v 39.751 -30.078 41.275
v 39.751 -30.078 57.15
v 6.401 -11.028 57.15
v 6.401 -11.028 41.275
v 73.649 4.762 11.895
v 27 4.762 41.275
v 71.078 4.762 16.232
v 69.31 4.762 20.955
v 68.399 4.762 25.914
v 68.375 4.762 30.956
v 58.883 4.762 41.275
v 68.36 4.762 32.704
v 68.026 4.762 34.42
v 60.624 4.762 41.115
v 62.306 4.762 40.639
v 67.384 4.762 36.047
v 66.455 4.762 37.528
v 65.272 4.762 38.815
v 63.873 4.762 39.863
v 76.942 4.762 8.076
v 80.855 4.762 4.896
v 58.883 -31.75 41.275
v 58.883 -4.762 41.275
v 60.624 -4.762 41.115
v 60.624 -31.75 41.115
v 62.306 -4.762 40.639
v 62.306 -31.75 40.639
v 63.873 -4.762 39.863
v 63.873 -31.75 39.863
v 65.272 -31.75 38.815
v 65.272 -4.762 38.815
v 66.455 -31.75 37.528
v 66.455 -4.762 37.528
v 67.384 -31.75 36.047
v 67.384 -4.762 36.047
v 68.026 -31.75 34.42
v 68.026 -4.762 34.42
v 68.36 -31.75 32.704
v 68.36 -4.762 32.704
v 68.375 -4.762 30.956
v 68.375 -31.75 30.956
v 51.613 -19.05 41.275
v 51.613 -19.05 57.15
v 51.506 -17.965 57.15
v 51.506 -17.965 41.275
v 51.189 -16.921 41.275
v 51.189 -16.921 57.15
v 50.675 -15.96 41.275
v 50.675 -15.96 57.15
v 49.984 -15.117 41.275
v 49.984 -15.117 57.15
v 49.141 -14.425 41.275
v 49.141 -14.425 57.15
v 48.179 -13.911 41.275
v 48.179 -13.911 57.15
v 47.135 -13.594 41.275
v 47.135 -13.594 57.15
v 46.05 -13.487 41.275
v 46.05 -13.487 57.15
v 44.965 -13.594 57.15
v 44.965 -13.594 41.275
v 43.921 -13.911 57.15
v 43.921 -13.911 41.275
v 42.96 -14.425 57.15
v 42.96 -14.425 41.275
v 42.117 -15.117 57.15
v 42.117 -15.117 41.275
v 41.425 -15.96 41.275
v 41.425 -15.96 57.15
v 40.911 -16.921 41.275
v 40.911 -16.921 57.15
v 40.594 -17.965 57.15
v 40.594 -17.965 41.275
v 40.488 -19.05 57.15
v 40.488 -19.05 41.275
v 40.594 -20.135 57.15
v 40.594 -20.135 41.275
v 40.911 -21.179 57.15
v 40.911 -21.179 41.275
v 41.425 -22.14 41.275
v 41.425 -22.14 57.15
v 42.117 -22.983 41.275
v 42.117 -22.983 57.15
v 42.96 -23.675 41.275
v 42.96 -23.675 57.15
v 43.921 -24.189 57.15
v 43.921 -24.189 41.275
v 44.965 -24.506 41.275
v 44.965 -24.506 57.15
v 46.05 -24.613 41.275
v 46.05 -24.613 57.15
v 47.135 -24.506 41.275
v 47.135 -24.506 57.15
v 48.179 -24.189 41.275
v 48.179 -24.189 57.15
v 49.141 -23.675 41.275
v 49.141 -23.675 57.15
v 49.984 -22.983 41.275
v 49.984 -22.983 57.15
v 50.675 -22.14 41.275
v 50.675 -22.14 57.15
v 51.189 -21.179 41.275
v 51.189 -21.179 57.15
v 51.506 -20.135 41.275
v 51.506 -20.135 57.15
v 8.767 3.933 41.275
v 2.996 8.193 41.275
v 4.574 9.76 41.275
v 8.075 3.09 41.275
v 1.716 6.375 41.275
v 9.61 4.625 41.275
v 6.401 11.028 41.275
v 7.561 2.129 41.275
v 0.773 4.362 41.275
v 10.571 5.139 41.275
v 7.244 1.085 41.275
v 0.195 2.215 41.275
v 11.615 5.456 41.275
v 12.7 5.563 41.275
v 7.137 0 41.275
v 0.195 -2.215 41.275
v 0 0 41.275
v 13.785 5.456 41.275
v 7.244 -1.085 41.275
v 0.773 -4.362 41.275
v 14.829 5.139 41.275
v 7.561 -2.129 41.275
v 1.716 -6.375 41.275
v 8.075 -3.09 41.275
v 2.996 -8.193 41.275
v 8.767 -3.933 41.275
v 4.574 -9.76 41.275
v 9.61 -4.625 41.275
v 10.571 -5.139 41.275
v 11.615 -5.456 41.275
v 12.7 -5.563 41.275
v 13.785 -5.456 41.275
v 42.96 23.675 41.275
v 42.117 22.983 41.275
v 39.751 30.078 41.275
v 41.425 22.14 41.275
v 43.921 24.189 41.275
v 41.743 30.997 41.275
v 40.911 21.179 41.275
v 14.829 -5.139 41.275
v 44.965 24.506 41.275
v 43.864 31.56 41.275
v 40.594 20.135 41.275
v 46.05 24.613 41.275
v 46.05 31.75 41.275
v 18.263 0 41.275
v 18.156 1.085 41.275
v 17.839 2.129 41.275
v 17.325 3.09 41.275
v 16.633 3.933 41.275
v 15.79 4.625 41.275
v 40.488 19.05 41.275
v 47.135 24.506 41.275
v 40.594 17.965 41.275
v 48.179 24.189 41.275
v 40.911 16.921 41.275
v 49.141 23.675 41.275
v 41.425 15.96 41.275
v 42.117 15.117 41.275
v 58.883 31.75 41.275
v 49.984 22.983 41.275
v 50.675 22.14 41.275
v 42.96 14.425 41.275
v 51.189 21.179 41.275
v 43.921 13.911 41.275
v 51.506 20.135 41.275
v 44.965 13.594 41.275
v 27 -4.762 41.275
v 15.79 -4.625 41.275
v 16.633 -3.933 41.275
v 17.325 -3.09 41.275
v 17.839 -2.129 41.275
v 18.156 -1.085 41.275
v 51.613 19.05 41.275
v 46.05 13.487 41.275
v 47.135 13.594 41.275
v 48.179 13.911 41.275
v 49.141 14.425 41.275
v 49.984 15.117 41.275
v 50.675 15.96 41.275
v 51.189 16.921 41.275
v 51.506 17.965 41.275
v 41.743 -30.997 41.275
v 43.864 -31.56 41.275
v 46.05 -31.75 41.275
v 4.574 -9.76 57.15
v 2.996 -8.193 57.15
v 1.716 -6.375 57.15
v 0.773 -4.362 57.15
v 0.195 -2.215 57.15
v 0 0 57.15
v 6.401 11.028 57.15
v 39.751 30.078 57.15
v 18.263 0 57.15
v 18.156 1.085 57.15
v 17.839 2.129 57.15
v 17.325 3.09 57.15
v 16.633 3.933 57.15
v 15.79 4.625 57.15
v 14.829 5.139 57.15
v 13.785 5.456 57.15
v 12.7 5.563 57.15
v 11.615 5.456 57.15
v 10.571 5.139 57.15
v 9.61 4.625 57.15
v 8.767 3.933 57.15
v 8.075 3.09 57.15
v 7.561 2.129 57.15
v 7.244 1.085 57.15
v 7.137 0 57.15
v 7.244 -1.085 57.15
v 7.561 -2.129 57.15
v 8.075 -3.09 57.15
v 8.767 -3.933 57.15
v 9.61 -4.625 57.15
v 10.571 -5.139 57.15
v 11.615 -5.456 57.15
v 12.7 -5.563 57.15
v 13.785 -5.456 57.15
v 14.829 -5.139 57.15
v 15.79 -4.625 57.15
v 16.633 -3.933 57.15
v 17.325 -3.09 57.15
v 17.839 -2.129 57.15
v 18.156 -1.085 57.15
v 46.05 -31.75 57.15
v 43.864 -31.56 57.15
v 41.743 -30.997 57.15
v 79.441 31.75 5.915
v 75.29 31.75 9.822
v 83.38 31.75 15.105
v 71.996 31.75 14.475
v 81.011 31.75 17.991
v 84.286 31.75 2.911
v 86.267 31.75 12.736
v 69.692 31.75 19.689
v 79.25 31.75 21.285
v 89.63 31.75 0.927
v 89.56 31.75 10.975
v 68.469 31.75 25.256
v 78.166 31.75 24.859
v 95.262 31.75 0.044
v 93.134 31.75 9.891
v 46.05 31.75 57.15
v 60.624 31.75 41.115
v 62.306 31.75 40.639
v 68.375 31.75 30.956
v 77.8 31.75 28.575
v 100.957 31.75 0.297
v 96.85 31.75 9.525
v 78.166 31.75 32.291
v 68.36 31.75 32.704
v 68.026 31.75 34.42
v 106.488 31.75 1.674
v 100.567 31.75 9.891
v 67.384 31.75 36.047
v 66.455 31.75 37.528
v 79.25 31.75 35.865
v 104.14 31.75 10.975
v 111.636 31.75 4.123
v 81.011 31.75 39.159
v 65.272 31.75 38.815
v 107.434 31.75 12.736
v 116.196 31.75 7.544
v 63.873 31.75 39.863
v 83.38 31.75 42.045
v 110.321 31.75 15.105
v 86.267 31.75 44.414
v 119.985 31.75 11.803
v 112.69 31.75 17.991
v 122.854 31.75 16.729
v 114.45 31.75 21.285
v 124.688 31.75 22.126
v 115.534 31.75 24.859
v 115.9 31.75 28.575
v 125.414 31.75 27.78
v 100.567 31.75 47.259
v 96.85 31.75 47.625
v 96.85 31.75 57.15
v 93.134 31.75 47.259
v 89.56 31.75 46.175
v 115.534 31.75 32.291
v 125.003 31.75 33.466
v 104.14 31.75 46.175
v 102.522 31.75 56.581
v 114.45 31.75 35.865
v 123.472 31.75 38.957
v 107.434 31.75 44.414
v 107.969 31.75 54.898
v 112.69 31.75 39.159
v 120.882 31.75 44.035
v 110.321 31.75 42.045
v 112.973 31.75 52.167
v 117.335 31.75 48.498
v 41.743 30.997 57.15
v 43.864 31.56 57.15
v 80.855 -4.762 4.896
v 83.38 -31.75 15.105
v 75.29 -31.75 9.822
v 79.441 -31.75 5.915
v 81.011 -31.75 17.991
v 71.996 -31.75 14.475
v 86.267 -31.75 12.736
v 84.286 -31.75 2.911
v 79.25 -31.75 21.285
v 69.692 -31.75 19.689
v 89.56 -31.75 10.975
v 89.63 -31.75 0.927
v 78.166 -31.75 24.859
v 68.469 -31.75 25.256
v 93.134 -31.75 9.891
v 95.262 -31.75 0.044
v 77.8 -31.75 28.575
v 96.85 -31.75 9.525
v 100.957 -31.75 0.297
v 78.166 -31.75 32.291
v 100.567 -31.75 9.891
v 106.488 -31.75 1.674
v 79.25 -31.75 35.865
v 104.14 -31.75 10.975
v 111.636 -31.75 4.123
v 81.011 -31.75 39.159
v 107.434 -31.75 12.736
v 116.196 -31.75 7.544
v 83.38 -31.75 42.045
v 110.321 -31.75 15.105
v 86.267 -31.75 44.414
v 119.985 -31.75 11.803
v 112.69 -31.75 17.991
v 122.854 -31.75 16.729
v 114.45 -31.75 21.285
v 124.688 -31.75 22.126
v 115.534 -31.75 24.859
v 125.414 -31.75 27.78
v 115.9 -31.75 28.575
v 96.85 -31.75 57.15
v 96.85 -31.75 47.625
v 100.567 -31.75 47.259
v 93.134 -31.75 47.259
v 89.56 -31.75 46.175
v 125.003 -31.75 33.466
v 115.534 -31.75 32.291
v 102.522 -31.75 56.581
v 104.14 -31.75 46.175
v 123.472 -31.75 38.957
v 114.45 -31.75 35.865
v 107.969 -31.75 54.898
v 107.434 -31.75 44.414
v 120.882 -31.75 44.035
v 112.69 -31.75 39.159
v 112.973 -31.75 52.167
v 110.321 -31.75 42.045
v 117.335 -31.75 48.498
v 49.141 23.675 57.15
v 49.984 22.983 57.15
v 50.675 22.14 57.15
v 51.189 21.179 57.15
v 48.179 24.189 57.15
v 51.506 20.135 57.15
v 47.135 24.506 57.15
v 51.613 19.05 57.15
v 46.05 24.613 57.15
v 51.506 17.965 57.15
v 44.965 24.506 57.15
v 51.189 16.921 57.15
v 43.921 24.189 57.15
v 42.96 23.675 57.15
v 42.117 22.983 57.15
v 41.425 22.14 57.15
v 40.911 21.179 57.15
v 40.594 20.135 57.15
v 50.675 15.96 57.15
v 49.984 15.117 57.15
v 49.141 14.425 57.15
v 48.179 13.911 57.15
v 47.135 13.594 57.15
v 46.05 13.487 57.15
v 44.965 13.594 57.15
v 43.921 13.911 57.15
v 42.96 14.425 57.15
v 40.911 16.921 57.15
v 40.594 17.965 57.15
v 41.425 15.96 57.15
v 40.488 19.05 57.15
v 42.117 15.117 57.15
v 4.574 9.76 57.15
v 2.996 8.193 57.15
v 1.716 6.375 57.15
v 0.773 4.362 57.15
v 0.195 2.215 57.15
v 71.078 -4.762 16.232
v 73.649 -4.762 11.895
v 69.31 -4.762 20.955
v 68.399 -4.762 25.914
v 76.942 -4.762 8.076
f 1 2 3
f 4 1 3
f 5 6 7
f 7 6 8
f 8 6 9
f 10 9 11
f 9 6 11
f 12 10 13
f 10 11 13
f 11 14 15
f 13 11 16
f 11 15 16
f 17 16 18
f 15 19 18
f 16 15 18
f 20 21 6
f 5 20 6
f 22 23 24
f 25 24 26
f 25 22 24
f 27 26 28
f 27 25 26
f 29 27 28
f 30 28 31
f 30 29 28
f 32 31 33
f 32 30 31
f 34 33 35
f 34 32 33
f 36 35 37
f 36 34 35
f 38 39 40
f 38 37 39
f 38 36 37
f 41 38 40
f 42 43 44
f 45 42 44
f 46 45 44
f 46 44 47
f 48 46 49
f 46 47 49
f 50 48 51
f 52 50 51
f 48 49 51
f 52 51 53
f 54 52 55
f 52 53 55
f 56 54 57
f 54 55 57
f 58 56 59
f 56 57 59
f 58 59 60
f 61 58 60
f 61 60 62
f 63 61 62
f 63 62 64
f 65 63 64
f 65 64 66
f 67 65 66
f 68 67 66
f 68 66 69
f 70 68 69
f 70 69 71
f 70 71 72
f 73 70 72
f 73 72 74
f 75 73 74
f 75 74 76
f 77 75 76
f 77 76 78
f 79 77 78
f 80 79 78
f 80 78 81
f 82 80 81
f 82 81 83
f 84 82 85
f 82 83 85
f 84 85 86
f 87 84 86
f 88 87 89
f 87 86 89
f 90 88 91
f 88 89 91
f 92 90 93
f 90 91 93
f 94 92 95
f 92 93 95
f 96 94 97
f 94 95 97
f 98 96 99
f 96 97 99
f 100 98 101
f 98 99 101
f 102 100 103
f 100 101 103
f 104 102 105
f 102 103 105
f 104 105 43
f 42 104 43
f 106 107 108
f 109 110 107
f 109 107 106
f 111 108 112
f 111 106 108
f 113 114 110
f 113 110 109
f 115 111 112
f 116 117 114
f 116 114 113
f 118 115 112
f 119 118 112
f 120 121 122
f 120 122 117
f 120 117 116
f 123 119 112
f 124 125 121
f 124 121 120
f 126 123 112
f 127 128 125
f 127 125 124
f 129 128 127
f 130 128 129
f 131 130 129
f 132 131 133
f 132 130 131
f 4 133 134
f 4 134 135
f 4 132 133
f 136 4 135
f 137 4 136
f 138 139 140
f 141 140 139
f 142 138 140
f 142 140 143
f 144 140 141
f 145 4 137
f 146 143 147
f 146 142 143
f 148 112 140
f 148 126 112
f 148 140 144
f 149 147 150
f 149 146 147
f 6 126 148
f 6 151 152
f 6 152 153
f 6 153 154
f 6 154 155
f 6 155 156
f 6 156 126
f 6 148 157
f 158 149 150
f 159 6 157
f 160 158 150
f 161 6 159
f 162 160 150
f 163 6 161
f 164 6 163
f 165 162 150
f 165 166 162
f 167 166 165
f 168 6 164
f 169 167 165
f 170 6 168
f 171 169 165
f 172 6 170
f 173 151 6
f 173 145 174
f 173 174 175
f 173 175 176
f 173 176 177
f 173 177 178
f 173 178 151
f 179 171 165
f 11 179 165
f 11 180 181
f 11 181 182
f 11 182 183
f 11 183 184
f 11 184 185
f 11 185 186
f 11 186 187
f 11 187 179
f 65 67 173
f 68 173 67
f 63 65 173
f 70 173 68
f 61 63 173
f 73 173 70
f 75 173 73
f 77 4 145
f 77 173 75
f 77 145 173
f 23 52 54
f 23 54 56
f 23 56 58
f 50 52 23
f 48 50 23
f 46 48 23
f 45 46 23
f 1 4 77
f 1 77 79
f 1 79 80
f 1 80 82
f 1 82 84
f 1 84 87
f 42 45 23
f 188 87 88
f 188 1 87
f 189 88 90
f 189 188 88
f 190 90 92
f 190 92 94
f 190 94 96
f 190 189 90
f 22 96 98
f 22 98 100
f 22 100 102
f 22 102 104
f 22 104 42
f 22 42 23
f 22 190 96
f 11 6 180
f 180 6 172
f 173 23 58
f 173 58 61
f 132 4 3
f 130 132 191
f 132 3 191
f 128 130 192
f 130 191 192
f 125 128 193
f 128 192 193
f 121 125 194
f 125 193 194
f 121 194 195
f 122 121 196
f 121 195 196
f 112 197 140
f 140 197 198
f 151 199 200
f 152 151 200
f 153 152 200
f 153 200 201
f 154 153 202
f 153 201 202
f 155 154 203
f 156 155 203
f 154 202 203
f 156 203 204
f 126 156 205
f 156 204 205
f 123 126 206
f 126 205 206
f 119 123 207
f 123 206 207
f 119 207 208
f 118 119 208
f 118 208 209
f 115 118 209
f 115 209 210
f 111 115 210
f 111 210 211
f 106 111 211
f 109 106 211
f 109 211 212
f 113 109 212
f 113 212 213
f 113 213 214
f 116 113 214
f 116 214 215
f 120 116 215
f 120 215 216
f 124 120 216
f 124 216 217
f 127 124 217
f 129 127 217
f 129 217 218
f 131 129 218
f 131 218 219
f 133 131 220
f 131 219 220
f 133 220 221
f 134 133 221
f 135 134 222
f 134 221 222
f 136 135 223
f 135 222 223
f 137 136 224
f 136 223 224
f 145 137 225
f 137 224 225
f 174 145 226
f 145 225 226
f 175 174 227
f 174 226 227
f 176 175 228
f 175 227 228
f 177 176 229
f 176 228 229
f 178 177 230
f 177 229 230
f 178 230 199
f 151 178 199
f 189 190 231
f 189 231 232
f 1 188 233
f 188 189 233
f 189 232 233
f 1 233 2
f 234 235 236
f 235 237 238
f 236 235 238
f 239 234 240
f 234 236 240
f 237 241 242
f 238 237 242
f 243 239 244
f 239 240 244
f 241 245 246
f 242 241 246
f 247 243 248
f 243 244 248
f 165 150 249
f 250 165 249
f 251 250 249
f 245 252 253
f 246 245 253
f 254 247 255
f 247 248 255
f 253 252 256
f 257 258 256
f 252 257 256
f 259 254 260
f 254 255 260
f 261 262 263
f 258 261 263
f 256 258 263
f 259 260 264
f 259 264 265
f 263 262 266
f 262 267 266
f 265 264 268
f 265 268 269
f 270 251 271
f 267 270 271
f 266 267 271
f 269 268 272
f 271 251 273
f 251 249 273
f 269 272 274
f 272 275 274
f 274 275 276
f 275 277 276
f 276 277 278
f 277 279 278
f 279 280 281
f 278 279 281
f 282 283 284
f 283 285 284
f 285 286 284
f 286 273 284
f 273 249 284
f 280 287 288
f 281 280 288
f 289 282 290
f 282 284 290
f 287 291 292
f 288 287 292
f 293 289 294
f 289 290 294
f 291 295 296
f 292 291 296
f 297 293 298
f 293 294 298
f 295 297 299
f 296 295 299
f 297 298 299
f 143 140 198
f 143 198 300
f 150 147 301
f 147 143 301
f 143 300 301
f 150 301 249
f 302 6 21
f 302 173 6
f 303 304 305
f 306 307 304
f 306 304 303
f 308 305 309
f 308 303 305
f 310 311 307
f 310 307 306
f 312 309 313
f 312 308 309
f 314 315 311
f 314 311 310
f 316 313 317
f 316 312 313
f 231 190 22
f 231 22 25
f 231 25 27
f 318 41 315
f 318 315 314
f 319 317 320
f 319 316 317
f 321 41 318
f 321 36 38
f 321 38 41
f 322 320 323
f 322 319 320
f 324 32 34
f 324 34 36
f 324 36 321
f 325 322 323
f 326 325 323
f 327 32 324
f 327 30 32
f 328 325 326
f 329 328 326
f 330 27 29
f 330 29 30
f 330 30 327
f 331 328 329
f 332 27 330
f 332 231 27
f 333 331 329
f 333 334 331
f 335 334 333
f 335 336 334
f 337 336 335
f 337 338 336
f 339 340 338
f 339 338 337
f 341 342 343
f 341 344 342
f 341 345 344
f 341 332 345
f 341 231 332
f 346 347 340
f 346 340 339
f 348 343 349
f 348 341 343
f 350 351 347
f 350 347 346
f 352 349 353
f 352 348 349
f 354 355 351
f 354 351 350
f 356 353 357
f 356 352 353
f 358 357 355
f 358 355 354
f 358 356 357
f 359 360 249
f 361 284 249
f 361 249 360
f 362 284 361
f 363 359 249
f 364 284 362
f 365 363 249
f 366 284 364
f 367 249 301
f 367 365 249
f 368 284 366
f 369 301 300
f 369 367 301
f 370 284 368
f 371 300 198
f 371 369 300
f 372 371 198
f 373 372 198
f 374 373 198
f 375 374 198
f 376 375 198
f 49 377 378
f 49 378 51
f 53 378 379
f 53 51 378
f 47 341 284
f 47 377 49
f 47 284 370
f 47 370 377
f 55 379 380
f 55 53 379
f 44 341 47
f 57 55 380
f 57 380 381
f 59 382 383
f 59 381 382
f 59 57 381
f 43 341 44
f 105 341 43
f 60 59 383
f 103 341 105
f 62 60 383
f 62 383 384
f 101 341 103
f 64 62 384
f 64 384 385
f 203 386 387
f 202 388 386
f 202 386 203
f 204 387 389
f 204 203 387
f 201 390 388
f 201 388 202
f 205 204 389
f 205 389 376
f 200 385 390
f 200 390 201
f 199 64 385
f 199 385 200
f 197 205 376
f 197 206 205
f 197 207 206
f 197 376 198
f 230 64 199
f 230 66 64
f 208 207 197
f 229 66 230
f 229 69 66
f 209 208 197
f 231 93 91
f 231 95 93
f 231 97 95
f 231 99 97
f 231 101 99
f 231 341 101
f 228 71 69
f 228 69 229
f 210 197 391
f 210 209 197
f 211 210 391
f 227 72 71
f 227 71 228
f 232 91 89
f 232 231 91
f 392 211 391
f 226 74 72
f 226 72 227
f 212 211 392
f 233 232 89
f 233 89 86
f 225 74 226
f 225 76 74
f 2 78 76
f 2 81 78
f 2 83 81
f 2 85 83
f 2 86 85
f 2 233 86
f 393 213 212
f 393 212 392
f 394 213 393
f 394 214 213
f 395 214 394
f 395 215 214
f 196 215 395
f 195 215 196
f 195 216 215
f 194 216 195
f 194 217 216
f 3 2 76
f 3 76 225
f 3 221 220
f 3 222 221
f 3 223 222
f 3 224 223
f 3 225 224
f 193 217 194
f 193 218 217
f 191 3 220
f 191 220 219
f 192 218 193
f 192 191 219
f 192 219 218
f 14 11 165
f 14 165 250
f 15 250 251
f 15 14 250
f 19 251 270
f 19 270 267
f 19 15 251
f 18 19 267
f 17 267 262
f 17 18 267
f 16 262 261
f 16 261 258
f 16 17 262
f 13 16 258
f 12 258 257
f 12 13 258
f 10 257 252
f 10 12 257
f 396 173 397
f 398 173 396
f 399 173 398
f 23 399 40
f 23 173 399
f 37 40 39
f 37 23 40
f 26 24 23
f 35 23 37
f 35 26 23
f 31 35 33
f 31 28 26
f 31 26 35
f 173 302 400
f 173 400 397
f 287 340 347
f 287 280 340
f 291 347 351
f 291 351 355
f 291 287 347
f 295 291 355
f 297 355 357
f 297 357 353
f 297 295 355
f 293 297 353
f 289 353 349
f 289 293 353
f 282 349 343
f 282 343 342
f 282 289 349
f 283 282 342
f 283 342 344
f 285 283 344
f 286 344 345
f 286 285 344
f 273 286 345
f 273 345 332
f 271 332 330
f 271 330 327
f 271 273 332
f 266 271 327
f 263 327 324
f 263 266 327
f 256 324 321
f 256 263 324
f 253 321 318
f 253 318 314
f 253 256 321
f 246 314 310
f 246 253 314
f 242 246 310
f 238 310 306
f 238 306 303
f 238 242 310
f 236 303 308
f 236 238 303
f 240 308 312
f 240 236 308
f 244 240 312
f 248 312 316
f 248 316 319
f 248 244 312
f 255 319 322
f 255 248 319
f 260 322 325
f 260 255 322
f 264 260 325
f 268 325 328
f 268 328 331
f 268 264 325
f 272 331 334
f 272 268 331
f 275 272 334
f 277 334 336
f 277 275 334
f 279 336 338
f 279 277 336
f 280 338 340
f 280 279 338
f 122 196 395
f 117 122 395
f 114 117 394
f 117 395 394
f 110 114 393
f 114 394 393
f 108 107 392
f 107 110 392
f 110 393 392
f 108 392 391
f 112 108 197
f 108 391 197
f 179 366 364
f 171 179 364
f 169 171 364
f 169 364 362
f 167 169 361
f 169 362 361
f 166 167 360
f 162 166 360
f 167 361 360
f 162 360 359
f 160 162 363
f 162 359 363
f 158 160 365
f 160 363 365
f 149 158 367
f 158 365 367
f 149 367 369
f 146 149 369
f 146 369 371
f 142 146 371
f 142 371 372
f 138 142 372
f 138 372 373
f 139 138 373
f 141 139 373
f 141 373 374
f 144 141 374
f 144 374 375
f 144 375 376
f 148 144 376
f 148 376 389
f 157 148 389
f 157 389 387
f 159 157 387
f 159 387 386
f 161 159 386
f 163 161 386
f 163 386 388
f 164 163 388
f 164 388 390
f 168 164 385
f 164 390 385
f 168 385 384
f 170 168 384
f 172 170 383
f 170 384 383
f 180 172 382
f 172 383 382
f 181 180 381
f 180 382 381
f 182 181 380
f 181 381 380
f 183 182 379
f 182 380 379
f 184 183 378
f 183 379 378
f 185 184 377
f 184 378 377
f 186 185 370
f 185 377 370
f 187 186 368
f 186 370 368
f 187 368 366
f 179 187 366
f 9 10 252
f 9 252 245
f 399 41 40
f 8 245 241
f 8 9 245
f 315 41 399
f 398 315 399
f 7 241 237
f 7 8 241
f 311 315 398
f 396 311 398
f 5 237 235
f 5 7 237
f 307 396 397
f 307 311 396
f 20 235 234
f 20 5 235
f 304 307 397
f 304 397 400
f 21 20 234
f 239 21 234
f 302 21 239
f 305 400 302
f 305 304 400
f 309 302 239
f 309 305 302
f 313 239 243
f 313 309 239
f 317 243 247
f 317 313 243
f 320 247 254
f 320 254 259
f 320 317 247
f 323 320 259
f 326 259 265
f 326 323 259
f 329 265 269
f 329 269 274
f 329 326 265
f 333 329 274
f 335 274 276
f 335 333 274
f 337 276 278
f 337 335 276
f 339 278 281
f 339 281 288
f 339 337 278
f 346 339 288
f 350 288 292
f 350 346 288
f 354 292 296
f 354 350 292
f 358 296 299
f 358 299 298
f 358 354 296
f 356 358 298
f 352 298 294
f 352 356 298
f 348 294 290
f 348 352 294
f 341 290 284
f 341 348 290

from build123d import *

# Parameters (mm, degrees)
F0_R     = 19.05
F1_DEPTH = 31.75
F2_DEPTH = 4.7625
F4_DEPTH = 57.151
F3_R     = 5.5626
F5_DEPTH = 57.151


with BuildPart() as f1:
    # F0 (on Front) → F1 (new body, symmetric)
    with BuildSketch(Plane.XZ):
        with BuildLine():
            Line((96.8502, 57.15), (0, 57.15))
            Line((0, 57.15), (0, 41.275))
            Line((0, 41.275), (27.0002, 41.275))
            Line((27.0002, 41.275), (58.8827221407, 41.275))
            ThreePointArc((58.8827221407, 41.275), (65.8929323283, 38.1984554837), (68.3745916055, 30.95625))
            ThreePointArc((68.3745916055, 30.95625), (71.0782767463, 16.2324477191), (80.8551747025, 4.8961108636))
            ThreePointArc((80.8551747025, 4.8961108636), (124.1737693319, 20.2111979959), (96.8502, 57.15))
        make_face()
        with Locations((96.8502, 28.575)):
            Circle(F0_R, mode=Mode.SUBTRACT)
    extrude(amount=F1_DEPTH, both=True)

    # F0 (on Front) → F2 (join, symmetric)
    with BuildSketch(Plane.XZ):
        with BuildLine():
            Line((27.0002, 41.275), (80.8551747025, 4.8961108636))
            ThreePointArc((80.8551747025, 4.8961108636), (71.0782767463, 16.2324477191), (68.3745916055, 30.95625))
            ThreePointArc((68.3745916055, 30.95625), (65.8929323283, 38.1984554837), (58.8827221407, 41.275))
            Line((58.8827221407, 41.275), (27.0002, 41.275))
        make_face()
    extrude(amount=F2_DEPTH, both=True)

    # F3 (on face) → F4 (cut, through all)
    with BuildSketch(Plane.XY.offset(57.15)):
        with BuildLine():
            ThreePointArc((0, 1.86e-08), (1.7161647423, 6.3753715996), (6.4008445559, 11.0277214642))
            Line((6.4008445559, 11.0277214642), (39.7510445559, 30.0777214642))
            ThreePointArc((39.7510445559, 30.0777214642), (42.7915240875, 31.3248128824), (46.0502, 31.75))
            Line((46.0502, 31.75), (0, 31.75))
            Line((0, 31.75), (0, 1.86e-08))
        make_face()
        with BuildLine():
            ThreePointArc((6.4008445559, -11.0277214642), (1.716164733, -6.3753715835), (0, 1.86e-08))
            Line((0, 1.86e-08), (0, -31.75))
            Line((0, -31.75), (46.0502, -31.75))
            ThreePointArc((46.0502, -31.75), (42.7915240875, -31.3248128824), (39.7510445559, -30.0777214642))
            Line((39.7510445559, -30.0777214642), (6.4008445559, -11.0277214642))
        make_face()
    extrude(amount=-F4_DEPTH, mode=Mode.SUBTRACT)

    # F3 (on face) → F5 (cut, through all)
    with BuildSketch(Plane.XY.offset(57.15)):
        with Locations((12.7, 0)):
            Circle(F3_R)
        with Locations((46.0502, 19.05)):
            Circle(F3_R)
        with Locations((46.0502, -19.05)):
            Circle(F3_R)
    extrude(amount=-F5_DEPTH, mode=Mode.SUBTRACT)


solid = f1.part
